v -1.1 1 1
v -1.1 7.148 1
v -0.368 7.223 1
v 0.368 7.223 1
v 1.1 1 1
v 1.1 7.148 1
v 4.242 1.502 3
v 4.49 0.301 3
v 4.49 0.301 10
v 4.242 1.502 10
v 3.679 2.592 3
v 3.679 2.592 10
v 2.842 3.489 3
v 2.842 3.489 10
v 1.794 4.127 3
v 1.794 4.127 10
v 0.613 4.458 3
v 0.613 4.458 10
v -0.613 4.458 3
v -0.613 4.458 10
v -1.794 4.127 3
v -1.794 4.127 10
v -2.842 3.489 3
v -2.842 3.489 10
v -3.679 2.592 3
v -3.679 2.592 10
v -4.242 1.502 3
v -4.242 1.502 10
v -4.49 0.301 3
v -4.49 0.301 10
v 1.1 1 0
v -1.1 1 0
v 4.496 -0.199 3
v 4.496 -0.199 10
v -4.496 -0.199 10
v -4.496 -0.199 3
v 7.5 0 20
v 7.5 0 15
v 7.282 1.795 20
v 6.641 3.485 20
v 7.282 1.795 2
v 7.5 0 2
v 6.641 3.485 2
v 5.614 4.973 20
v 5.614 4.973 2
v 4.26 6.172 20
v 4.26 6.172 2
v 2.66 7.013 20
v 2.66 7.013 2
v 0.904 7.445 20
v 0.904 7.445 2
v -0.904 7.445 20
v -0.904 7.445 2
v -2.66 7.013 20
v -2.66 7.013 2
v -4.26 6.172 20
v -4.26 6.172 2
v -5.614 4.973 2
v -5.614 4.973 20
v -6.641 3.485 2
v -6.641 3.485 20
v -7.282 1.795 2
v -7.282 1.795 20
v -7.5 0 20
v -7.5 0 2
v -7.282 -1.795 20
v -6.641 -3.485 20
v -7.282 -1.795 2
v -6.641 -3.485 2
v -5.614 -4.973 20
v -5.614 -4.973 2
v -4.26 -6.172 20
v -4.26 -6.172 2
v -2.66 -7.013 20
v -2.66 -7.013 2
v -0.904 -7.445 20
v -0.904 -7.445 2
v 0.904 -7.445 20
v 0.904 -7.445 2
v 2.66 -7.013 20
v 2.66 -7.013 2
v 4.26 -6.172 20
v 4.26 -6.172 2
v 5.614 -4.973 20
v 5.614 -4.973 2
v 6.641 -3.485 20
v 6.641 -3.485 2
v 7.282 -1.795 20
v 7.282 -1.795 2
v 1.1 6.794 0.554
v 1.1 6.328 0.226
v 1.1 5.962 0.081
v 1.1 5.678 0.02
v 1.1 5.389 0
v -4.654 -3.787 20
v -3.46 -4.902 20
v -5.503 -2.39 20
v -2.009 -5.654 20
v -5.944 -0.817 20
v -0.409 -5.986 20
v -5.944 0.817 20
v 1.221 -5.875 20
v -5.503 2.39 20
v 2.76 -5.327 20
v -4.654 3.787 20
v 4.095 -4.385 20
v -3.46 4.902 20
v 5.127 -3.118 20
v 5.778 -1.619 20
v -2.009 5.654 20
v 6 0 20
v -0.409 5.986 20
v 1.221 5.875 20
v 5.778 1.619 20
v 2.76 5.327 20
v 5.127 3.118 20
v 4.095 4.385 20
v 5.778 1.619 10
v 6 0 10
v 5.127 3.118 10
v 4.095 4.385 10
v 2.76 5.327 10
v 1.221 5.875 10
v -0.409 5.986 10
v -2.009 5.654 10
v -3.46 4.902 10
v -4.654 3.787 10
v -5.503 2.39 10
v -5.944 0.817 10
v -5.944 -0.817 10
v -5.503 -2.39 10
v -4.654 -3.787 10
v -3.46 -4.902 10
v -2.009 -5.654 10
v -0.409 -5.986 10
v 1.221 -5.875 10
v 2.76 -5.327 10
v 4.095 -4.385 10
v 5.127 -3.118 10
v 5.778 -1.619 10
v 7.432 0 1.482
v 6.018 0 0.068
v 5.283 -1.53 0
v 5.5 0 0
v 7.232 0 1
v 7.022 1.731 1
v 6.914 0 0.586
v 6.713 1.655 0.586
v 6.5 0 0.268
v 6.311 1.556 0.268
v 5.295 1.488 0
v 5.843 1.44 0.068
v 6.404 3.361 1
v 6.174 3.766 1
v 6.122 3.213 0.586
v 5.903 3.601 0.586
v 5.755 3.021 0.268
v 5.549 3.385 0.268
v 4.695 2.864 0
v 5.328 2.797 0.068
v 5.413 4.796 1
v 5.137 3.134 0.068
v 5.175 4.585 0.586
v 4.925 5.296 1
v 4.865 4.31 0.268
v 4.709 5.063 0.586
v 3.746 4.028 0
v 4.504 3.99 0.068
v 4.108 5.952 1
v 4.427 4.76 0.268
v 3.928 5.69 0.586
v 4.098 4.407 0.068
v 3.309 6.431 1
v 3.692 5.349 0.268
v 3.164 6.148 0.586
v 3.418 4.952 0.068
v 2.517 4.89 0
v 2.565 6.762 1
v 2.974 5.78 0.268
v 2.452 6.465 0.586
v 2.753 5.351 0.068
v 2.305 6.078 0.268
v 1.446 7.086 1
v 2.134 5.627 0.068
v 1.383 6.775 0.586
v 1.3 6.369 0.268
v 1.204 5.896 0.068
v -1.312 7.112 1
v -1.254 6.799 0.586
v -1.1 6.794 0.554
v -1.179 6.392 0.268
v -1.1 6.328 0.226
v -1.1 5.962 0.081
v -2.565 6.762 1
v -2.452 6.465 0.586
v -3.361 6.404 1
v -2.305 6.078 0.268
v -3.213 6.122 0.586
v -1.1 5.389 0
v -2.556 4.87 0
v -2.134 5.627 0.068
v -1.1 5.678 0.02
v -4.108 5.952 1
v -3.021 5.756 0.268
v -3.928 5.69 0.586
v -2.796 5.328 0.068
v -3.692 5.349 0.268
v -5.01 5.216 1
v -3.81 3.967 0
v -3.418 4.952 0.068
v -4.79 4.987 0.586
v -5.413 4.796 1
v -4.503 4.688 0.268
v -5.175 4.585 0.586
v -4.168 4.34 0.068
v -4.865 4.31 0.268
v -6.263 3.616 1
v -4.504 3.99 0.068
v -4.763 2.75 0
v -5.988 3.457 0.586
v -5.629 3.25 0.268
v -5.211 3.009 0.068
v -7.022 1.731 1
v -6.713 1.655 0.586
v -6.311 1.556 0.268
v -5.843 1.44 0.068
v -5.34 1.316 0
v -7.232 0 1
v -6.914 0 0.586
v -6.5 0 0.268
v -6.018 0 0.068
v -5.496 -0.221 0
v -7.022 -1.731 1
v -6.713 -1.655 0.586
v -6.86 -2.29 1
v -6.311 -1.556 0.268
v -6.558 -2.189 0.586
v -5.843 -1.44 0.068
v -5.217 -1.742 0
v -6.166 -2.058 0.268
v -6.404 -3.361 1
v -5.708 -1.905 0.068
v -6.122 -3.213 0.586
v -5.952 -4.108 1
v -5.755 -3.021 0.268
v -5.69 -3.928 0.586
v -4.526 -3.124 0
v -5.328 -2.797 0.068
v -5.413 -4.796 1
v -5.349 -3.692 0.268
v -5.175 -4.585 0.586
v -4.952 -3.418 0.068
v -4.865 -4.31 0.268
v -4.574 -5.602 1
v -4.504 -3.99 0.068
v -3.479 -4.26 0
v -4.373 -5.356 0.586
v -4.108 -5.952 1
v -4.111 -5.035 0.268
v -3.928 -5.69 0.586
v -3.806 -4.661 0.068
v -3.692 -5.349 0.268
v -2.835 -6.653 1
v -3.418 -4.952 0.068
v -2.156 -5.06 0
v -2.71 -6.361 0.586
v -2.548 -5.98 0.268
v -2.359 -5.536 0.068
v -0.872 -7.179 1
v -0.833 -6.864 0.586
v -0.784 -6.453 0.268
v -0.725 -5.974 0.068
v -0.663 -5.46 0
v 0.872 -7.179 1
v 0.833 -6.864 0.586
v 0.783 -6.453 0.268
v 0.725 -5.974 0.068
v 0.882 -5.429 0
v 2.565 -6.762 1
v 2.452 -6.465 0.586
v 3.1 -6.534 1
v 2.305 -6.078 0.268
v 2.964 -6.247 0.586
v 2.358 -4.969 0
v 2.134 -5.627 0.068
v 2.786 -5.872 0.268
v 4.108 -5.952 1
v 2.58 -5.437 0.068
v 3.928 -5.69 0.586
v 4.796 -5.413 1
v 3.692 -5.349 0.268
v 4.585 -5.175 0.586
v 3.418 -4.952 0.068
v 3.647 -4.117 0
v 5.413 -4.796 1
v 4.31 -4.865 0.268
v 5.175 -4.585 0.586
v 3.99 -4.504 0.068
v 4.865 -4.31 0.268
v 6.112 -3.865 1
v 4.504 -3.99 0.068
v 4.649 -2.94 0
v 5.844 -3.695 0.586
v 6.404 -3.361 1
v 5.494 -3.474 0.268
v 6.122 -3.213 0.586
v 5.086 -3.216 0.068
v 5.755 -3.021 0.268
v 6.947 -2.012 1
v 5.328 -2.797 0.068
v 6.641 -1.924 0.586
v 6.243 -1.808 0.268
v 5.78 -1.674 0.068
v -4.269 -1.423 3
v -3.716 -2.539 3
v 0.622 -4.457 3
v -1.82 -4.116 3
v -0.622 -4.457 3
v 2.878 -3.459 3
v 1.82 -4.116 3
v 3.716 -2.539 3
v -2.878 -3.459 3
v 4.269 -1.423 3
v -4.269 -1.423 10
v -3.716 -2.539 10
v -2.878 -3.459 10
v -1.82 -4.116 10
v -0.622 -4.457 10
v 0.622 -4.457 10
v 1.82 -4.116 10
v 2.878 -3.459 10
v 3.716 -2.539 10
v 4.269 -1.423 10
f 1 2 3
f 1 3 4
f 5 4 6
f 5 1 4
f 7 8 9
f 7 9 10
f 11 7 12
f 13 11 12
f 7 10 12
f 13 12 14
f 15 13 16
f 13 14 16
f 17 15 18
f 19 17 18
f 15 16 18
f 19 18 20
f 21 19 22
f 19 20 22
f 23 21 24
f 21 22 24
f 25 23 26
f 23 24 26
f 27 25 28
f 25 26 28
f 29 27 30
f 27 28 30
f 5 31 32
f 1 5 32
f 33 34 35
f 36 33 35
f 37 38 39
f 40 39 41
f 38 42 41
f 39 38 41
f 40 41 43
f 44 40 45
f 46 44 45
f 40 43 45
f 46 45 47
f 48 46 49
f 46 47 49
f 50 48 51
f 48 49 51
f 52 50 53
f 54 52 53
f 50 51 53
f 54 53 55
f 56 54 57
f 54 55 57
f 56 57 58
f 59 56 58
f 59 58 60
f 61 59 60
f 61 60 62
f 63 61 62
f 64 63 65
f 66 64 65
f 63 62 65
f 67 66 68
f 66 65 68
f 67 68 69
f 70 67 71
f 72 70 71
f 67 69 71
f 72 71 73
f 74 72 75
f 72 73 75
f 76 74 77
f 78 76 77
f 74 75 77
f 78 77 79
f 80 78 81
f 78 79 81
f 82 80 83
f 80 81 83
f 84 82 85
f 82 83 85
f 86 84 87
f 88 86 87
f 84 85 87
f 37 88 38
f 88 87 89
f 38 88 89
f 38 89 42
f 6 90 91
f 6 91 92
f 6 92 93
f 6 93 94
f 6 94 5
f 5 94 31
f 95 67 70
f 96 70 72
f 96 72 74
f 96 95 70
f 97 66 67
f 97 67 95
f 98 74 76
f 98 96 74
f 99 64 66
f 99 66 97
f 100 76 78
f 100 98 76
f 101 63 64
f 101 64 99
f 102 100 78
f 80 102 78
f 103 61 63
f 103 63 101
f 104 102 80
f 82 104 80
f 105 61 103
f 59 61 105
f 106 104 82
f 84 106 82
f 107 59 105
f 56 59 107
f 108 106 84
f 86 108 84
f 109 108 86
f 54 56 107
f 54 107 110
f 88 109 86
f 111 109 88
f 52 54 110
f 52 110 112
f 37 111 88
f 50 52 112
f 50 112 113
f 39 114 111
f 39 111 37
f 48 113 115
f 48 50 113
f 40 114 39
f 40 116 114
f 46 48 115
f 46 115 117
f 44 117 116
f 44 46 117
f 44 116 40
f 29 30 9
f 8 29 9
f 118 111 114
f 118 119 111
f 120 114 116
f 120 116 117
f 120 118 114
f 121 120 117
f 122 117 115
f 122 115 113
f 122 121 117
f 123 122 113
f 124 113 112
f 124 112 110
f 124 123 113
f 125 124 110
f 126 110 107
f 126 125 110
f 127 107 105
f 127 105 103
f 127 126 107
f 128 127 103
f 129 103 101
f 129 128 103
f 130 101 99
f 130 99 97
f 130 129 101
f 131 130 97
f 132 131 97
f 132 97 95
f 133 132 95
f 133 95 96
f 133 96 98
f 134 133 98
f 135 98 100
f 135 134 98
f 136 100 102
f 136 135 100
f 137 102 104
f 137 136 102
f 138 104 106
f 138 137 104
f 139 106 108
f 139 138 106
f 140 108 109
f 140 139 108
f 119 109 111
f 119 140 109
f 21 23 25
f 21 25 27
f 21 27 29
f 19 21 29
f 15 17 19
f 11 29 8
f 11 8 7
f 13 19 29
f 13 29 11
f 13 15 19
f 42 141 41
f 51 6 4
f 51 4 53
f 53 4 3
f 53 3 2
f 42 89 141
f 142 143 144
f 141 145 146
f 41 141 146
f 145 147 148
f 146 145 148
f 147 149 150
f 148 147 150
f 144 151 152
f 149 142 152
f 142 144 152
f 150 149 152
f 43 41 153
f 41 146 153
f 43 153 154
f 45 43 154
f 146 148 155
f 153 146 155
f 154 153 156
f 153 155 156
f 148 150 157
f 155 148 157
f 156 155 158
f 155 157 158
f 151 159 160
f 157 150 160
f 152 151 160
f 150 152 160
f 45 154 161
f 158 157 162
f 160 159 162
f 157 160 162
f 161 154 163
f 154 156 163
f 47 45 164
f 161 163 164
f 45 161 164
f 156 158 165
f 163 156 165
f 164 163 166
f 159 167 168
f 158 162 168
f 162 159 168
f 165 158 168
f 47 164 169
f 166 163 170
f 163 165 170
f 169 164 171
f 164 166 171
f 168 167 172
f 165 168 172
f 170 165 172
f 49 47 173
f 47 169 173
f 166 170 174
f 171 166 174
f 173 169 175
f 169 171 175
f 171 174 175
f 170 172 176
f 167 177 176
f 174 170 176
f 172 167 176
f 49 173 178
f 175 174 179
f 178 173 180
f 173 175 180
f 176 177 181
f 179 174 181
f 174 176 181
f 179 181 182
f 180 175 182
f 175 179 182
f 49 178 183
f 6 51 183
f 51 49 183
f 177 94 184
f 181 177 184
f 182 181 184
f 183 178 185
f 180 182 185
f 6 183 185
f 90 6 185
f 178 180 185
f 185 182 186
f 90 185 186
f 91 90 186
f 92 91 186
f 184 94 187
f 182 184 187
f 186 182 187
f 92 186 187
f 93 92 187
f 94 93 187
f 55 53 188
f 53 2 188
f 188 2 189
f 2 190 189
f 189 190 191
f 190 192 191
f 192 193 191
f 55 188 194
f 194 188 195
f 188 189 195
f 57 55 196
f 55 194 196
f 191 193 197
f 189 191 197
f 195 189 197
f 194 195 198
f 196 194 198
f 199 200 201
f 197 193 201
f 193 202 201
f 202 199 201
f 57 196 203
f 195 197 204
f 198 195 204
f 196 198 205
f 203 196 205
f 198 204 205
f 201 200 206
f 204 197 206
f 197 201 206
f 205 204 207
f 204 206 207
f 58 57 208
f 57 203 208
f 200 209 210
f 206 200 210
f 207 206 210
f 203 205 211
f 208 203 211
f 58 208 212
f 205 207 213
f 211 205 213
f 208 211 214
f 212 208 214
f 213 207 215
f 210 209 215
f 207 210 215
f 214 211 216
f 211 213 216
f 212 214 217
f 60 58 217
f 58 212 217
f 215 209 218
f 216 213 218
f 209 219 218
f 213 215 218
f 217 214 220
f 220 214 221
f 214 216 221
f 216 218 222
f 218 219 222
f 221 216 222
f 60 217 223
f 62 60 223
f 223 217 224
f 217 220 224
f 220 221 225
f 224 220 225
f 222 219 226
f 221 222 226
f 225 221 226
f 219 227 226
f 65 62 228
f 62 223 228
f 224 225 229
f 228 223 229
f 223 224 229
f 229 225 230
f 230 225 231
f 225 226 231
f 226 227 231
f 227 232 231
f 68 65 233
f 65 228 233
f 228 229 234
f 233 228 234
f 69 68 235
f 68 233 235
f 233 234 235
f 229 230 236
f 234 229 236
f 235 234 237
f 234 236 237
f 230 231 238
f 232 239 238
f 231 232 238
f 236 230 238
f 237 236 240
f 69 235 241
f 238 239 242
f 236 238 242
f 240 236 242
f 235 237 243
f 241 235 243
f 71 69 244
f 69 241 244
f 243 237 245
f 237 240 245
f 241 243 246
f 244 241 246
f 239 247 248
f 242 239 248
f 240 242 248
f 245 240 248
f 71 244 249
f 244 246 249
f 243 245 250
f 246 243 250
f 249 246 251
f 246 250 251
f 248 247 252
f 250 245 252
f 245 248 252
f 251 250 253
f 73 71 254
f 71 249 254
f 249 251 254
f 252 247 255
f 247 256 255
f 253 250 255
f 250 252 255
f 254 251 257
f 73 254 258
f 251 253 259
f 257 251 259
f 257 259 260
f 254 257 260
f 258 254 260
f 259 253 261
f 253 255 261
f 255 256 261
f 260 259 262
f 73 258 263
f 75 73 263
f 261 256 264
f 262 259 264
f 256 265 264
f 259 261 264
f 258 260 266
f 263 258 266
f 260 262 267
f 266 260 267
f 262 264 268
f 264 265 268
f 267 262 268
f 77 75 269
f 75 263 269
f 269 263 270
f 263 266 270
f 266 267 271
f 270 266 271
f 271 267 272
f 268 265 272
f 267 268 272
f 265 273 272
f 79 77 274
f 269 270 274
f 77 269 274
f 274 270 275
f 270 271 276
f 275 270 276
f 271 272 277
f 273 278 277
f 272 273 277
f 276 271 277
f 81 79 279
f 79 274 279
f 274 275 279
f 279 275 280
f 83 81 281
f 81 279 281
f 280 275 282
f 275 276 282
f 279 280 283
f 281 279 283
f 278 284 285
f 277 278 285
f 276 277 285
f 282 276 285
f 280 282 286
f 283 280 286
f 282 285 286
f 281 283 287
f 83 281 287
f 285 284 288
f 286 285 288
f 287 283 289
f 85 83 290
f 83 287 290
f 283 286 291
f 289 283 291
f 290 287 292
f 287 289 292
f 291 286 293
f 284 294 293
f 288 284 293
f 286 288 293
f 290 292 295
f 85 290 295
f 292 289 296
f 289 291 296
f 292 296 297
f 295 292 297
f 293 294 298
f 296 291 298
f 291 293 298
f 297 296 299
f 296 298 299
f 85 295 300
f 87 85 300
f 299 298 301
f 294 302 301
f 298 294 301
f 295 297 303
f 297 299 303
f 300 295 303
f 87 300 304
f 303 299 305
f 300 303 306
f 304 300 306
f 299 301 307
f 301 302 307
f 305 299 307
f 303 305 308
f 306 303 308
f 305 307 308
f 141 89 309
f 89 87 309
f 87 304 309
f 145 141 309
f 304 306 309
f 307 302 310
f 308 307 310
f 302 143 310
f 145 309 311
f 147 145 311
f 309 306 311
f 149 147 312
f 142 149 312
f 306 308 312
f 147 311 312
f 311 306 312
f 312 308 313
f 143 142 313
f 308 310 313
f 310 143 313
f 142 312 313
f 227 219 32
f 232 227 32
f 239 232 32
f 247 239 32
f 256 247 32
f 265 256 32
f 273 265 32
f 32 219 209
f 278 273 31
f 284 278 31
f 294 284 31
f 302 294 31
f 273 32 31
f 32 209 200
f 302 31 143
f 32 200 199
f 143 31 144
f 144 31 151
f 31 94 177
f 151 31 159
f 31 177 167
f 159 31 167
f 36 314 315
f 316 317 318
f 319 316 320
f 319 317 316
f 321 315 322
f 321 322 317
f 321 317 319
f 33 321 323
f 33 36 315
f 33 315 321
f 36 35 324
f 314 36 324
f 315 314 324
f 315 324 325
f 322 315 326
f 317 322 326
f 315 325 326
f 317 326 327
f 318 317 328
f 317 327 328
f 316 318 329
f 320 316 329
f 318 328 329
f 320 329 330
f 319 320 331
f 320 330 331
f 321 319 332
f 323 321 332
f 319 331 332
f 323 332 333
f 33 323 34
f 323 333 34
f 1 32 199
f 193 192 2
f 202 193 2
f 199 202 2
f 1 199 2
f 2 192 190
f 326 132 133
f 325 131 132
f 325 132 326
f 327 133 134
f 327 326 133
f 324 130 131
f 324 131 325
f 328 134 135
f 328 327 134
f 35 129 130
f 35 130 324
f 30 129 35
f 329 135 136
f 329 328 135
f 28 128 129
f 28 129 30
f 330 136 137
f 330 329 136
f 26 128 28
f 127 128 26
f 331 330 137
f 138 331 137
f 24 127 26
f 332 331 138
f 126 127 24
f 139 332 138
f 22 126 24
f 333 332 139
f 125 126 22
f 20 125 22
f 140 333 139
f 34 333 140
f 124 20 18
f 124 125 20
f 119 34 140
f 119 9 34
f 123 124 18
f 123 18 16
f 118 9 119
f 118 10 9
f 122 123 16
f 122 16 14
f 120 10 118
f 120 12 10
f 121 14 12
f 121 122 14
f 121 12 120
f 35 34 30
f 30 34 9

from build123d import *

# Parameters (mm, degrees)
F0_R        = 7.5
F1_DEPTH    = 10
F3_DEPTH    = 7
F5_DEPTH    = 1
F6_T2_ANGLE = 299.893258673
F6_T4_ANGLE = 119.7759847122
F2_R        = 7.5
F2_R_2      = 6
F7_DEPTH    = 5
F8_DEPTH    = 5


# Not quite as in the source:
# - a fillet or chamfer that OpenCascade refuses, or shapes differently, is made with other operations: its cross-section is extruded or revolved along the edge and cut away or added


with BuildPart() as f1:
    # F0 (on Top) → F1 (new body)
    with BuildSketch(Plane.XY):
        Circle(F0_R)
    extrude(amount=F1_DEPTH)

    # F2 (on face) → F3 (cut)
    with BuildSketch(Plane.XY.offset(10)):
        with BuildLine():
            Line((-4.4899339722, 0.3008204206), (4.4899339722, 0.3008204206))
            ThreePointArc((4.4899339722, 0.3008204206), (0, 4.5), (-4.4899339722, 0.3008204206))
        make_face()
        with BuildLine():
            ThreePointArc((-4.4955897828, -0.1991795794), (0, -4.5), (4.4955897828, -0.1991795794))
            Line((4.4955897828, -0.1991795794), (-4.4955897828, -0.1991795794))
        make_face()
    extrude(amount=-F3_DEPTH, mode=Mode.SUBTRACT)

    # F4 (on face) → F5 (cut)
    with BuildSketch(Plane(origin=(0, 0, 0), x_dir=(1, 0, 0), z_dir=(0, 0, -1))):
        with BuildLine():
            Line((-1.1, -1), (-1.1, -7.4188947964))
            ThreePointArc((-1.1, -7.4188947964), (0, -7.5), (1.1, -7.4188947964))
            Line((1.1, -7.4188947964), (1.1, -1))
            Line((1.1, -1), (0, -1))
            Line((0, -1), (-1.1, -1))
        make_face()
    extrude(amount=-F5_DEPTH, mode=Mode.SUBTRACT)

    # F6: fillet of radius 2 on 1 edges, made by hand

    # F6_s1 → F6_t2 (revolve, cut)
    with BuildSketch(Plane(origin=(0, 0, 0), x_dir=(0, 0, 1), z_dir=(0.8669553942, -0.4983857387, 0))):
        with BuildLine():
            ThreePointArc((2, -7.5), (0.5857864376, -6.9142135624), (0, -5.5))
            Line((0, -5.5), (0, -7.5))
            Line((0, -7.5), (2, -7.5))
        make_face()
    revolve(axis=Axis((0, 0, 0), (0, 0, 1)), revolution_arc=F6_T2_ANGLE, mode=Mode.SUBTRACT)

    # F6_s3 → F6_t4 (revolve, cut)
    with BuildSketch(Plane.XZ):
        with BuildLine():
            ThreePointArc((7.5, 2), (6.9142135624, 0.5857864376), (5.5, 0))
            Line((5.5, 0), (7.5, 0))
            Line((7.5, 0), (7.5, 2))
        make_face()
    revolve(axis=Axis((0, 0, 0), (0, 0, 1)), revolution_arc=F6_T4_ANGLE, mode=Mode.SUBTRACT)

    # F2 (on face) → F7 (join)
    with BuildSketch(Plane.XY.offset(10)):
        Circle(F2_R)
        Circle(F2_R_2, mode=Mode.SUBTRACT)
    extrude(amount=F7_DEPTH)

    # F8 (add): a face of the model
    f8_faces = [f1.faces().sort_by_distance(p)[0] for p in [
        (-7.2878679656, 0, 15),
    ]]
    extrude(f8_faces, amount=F8_DEPTH)


solid = f1.part
